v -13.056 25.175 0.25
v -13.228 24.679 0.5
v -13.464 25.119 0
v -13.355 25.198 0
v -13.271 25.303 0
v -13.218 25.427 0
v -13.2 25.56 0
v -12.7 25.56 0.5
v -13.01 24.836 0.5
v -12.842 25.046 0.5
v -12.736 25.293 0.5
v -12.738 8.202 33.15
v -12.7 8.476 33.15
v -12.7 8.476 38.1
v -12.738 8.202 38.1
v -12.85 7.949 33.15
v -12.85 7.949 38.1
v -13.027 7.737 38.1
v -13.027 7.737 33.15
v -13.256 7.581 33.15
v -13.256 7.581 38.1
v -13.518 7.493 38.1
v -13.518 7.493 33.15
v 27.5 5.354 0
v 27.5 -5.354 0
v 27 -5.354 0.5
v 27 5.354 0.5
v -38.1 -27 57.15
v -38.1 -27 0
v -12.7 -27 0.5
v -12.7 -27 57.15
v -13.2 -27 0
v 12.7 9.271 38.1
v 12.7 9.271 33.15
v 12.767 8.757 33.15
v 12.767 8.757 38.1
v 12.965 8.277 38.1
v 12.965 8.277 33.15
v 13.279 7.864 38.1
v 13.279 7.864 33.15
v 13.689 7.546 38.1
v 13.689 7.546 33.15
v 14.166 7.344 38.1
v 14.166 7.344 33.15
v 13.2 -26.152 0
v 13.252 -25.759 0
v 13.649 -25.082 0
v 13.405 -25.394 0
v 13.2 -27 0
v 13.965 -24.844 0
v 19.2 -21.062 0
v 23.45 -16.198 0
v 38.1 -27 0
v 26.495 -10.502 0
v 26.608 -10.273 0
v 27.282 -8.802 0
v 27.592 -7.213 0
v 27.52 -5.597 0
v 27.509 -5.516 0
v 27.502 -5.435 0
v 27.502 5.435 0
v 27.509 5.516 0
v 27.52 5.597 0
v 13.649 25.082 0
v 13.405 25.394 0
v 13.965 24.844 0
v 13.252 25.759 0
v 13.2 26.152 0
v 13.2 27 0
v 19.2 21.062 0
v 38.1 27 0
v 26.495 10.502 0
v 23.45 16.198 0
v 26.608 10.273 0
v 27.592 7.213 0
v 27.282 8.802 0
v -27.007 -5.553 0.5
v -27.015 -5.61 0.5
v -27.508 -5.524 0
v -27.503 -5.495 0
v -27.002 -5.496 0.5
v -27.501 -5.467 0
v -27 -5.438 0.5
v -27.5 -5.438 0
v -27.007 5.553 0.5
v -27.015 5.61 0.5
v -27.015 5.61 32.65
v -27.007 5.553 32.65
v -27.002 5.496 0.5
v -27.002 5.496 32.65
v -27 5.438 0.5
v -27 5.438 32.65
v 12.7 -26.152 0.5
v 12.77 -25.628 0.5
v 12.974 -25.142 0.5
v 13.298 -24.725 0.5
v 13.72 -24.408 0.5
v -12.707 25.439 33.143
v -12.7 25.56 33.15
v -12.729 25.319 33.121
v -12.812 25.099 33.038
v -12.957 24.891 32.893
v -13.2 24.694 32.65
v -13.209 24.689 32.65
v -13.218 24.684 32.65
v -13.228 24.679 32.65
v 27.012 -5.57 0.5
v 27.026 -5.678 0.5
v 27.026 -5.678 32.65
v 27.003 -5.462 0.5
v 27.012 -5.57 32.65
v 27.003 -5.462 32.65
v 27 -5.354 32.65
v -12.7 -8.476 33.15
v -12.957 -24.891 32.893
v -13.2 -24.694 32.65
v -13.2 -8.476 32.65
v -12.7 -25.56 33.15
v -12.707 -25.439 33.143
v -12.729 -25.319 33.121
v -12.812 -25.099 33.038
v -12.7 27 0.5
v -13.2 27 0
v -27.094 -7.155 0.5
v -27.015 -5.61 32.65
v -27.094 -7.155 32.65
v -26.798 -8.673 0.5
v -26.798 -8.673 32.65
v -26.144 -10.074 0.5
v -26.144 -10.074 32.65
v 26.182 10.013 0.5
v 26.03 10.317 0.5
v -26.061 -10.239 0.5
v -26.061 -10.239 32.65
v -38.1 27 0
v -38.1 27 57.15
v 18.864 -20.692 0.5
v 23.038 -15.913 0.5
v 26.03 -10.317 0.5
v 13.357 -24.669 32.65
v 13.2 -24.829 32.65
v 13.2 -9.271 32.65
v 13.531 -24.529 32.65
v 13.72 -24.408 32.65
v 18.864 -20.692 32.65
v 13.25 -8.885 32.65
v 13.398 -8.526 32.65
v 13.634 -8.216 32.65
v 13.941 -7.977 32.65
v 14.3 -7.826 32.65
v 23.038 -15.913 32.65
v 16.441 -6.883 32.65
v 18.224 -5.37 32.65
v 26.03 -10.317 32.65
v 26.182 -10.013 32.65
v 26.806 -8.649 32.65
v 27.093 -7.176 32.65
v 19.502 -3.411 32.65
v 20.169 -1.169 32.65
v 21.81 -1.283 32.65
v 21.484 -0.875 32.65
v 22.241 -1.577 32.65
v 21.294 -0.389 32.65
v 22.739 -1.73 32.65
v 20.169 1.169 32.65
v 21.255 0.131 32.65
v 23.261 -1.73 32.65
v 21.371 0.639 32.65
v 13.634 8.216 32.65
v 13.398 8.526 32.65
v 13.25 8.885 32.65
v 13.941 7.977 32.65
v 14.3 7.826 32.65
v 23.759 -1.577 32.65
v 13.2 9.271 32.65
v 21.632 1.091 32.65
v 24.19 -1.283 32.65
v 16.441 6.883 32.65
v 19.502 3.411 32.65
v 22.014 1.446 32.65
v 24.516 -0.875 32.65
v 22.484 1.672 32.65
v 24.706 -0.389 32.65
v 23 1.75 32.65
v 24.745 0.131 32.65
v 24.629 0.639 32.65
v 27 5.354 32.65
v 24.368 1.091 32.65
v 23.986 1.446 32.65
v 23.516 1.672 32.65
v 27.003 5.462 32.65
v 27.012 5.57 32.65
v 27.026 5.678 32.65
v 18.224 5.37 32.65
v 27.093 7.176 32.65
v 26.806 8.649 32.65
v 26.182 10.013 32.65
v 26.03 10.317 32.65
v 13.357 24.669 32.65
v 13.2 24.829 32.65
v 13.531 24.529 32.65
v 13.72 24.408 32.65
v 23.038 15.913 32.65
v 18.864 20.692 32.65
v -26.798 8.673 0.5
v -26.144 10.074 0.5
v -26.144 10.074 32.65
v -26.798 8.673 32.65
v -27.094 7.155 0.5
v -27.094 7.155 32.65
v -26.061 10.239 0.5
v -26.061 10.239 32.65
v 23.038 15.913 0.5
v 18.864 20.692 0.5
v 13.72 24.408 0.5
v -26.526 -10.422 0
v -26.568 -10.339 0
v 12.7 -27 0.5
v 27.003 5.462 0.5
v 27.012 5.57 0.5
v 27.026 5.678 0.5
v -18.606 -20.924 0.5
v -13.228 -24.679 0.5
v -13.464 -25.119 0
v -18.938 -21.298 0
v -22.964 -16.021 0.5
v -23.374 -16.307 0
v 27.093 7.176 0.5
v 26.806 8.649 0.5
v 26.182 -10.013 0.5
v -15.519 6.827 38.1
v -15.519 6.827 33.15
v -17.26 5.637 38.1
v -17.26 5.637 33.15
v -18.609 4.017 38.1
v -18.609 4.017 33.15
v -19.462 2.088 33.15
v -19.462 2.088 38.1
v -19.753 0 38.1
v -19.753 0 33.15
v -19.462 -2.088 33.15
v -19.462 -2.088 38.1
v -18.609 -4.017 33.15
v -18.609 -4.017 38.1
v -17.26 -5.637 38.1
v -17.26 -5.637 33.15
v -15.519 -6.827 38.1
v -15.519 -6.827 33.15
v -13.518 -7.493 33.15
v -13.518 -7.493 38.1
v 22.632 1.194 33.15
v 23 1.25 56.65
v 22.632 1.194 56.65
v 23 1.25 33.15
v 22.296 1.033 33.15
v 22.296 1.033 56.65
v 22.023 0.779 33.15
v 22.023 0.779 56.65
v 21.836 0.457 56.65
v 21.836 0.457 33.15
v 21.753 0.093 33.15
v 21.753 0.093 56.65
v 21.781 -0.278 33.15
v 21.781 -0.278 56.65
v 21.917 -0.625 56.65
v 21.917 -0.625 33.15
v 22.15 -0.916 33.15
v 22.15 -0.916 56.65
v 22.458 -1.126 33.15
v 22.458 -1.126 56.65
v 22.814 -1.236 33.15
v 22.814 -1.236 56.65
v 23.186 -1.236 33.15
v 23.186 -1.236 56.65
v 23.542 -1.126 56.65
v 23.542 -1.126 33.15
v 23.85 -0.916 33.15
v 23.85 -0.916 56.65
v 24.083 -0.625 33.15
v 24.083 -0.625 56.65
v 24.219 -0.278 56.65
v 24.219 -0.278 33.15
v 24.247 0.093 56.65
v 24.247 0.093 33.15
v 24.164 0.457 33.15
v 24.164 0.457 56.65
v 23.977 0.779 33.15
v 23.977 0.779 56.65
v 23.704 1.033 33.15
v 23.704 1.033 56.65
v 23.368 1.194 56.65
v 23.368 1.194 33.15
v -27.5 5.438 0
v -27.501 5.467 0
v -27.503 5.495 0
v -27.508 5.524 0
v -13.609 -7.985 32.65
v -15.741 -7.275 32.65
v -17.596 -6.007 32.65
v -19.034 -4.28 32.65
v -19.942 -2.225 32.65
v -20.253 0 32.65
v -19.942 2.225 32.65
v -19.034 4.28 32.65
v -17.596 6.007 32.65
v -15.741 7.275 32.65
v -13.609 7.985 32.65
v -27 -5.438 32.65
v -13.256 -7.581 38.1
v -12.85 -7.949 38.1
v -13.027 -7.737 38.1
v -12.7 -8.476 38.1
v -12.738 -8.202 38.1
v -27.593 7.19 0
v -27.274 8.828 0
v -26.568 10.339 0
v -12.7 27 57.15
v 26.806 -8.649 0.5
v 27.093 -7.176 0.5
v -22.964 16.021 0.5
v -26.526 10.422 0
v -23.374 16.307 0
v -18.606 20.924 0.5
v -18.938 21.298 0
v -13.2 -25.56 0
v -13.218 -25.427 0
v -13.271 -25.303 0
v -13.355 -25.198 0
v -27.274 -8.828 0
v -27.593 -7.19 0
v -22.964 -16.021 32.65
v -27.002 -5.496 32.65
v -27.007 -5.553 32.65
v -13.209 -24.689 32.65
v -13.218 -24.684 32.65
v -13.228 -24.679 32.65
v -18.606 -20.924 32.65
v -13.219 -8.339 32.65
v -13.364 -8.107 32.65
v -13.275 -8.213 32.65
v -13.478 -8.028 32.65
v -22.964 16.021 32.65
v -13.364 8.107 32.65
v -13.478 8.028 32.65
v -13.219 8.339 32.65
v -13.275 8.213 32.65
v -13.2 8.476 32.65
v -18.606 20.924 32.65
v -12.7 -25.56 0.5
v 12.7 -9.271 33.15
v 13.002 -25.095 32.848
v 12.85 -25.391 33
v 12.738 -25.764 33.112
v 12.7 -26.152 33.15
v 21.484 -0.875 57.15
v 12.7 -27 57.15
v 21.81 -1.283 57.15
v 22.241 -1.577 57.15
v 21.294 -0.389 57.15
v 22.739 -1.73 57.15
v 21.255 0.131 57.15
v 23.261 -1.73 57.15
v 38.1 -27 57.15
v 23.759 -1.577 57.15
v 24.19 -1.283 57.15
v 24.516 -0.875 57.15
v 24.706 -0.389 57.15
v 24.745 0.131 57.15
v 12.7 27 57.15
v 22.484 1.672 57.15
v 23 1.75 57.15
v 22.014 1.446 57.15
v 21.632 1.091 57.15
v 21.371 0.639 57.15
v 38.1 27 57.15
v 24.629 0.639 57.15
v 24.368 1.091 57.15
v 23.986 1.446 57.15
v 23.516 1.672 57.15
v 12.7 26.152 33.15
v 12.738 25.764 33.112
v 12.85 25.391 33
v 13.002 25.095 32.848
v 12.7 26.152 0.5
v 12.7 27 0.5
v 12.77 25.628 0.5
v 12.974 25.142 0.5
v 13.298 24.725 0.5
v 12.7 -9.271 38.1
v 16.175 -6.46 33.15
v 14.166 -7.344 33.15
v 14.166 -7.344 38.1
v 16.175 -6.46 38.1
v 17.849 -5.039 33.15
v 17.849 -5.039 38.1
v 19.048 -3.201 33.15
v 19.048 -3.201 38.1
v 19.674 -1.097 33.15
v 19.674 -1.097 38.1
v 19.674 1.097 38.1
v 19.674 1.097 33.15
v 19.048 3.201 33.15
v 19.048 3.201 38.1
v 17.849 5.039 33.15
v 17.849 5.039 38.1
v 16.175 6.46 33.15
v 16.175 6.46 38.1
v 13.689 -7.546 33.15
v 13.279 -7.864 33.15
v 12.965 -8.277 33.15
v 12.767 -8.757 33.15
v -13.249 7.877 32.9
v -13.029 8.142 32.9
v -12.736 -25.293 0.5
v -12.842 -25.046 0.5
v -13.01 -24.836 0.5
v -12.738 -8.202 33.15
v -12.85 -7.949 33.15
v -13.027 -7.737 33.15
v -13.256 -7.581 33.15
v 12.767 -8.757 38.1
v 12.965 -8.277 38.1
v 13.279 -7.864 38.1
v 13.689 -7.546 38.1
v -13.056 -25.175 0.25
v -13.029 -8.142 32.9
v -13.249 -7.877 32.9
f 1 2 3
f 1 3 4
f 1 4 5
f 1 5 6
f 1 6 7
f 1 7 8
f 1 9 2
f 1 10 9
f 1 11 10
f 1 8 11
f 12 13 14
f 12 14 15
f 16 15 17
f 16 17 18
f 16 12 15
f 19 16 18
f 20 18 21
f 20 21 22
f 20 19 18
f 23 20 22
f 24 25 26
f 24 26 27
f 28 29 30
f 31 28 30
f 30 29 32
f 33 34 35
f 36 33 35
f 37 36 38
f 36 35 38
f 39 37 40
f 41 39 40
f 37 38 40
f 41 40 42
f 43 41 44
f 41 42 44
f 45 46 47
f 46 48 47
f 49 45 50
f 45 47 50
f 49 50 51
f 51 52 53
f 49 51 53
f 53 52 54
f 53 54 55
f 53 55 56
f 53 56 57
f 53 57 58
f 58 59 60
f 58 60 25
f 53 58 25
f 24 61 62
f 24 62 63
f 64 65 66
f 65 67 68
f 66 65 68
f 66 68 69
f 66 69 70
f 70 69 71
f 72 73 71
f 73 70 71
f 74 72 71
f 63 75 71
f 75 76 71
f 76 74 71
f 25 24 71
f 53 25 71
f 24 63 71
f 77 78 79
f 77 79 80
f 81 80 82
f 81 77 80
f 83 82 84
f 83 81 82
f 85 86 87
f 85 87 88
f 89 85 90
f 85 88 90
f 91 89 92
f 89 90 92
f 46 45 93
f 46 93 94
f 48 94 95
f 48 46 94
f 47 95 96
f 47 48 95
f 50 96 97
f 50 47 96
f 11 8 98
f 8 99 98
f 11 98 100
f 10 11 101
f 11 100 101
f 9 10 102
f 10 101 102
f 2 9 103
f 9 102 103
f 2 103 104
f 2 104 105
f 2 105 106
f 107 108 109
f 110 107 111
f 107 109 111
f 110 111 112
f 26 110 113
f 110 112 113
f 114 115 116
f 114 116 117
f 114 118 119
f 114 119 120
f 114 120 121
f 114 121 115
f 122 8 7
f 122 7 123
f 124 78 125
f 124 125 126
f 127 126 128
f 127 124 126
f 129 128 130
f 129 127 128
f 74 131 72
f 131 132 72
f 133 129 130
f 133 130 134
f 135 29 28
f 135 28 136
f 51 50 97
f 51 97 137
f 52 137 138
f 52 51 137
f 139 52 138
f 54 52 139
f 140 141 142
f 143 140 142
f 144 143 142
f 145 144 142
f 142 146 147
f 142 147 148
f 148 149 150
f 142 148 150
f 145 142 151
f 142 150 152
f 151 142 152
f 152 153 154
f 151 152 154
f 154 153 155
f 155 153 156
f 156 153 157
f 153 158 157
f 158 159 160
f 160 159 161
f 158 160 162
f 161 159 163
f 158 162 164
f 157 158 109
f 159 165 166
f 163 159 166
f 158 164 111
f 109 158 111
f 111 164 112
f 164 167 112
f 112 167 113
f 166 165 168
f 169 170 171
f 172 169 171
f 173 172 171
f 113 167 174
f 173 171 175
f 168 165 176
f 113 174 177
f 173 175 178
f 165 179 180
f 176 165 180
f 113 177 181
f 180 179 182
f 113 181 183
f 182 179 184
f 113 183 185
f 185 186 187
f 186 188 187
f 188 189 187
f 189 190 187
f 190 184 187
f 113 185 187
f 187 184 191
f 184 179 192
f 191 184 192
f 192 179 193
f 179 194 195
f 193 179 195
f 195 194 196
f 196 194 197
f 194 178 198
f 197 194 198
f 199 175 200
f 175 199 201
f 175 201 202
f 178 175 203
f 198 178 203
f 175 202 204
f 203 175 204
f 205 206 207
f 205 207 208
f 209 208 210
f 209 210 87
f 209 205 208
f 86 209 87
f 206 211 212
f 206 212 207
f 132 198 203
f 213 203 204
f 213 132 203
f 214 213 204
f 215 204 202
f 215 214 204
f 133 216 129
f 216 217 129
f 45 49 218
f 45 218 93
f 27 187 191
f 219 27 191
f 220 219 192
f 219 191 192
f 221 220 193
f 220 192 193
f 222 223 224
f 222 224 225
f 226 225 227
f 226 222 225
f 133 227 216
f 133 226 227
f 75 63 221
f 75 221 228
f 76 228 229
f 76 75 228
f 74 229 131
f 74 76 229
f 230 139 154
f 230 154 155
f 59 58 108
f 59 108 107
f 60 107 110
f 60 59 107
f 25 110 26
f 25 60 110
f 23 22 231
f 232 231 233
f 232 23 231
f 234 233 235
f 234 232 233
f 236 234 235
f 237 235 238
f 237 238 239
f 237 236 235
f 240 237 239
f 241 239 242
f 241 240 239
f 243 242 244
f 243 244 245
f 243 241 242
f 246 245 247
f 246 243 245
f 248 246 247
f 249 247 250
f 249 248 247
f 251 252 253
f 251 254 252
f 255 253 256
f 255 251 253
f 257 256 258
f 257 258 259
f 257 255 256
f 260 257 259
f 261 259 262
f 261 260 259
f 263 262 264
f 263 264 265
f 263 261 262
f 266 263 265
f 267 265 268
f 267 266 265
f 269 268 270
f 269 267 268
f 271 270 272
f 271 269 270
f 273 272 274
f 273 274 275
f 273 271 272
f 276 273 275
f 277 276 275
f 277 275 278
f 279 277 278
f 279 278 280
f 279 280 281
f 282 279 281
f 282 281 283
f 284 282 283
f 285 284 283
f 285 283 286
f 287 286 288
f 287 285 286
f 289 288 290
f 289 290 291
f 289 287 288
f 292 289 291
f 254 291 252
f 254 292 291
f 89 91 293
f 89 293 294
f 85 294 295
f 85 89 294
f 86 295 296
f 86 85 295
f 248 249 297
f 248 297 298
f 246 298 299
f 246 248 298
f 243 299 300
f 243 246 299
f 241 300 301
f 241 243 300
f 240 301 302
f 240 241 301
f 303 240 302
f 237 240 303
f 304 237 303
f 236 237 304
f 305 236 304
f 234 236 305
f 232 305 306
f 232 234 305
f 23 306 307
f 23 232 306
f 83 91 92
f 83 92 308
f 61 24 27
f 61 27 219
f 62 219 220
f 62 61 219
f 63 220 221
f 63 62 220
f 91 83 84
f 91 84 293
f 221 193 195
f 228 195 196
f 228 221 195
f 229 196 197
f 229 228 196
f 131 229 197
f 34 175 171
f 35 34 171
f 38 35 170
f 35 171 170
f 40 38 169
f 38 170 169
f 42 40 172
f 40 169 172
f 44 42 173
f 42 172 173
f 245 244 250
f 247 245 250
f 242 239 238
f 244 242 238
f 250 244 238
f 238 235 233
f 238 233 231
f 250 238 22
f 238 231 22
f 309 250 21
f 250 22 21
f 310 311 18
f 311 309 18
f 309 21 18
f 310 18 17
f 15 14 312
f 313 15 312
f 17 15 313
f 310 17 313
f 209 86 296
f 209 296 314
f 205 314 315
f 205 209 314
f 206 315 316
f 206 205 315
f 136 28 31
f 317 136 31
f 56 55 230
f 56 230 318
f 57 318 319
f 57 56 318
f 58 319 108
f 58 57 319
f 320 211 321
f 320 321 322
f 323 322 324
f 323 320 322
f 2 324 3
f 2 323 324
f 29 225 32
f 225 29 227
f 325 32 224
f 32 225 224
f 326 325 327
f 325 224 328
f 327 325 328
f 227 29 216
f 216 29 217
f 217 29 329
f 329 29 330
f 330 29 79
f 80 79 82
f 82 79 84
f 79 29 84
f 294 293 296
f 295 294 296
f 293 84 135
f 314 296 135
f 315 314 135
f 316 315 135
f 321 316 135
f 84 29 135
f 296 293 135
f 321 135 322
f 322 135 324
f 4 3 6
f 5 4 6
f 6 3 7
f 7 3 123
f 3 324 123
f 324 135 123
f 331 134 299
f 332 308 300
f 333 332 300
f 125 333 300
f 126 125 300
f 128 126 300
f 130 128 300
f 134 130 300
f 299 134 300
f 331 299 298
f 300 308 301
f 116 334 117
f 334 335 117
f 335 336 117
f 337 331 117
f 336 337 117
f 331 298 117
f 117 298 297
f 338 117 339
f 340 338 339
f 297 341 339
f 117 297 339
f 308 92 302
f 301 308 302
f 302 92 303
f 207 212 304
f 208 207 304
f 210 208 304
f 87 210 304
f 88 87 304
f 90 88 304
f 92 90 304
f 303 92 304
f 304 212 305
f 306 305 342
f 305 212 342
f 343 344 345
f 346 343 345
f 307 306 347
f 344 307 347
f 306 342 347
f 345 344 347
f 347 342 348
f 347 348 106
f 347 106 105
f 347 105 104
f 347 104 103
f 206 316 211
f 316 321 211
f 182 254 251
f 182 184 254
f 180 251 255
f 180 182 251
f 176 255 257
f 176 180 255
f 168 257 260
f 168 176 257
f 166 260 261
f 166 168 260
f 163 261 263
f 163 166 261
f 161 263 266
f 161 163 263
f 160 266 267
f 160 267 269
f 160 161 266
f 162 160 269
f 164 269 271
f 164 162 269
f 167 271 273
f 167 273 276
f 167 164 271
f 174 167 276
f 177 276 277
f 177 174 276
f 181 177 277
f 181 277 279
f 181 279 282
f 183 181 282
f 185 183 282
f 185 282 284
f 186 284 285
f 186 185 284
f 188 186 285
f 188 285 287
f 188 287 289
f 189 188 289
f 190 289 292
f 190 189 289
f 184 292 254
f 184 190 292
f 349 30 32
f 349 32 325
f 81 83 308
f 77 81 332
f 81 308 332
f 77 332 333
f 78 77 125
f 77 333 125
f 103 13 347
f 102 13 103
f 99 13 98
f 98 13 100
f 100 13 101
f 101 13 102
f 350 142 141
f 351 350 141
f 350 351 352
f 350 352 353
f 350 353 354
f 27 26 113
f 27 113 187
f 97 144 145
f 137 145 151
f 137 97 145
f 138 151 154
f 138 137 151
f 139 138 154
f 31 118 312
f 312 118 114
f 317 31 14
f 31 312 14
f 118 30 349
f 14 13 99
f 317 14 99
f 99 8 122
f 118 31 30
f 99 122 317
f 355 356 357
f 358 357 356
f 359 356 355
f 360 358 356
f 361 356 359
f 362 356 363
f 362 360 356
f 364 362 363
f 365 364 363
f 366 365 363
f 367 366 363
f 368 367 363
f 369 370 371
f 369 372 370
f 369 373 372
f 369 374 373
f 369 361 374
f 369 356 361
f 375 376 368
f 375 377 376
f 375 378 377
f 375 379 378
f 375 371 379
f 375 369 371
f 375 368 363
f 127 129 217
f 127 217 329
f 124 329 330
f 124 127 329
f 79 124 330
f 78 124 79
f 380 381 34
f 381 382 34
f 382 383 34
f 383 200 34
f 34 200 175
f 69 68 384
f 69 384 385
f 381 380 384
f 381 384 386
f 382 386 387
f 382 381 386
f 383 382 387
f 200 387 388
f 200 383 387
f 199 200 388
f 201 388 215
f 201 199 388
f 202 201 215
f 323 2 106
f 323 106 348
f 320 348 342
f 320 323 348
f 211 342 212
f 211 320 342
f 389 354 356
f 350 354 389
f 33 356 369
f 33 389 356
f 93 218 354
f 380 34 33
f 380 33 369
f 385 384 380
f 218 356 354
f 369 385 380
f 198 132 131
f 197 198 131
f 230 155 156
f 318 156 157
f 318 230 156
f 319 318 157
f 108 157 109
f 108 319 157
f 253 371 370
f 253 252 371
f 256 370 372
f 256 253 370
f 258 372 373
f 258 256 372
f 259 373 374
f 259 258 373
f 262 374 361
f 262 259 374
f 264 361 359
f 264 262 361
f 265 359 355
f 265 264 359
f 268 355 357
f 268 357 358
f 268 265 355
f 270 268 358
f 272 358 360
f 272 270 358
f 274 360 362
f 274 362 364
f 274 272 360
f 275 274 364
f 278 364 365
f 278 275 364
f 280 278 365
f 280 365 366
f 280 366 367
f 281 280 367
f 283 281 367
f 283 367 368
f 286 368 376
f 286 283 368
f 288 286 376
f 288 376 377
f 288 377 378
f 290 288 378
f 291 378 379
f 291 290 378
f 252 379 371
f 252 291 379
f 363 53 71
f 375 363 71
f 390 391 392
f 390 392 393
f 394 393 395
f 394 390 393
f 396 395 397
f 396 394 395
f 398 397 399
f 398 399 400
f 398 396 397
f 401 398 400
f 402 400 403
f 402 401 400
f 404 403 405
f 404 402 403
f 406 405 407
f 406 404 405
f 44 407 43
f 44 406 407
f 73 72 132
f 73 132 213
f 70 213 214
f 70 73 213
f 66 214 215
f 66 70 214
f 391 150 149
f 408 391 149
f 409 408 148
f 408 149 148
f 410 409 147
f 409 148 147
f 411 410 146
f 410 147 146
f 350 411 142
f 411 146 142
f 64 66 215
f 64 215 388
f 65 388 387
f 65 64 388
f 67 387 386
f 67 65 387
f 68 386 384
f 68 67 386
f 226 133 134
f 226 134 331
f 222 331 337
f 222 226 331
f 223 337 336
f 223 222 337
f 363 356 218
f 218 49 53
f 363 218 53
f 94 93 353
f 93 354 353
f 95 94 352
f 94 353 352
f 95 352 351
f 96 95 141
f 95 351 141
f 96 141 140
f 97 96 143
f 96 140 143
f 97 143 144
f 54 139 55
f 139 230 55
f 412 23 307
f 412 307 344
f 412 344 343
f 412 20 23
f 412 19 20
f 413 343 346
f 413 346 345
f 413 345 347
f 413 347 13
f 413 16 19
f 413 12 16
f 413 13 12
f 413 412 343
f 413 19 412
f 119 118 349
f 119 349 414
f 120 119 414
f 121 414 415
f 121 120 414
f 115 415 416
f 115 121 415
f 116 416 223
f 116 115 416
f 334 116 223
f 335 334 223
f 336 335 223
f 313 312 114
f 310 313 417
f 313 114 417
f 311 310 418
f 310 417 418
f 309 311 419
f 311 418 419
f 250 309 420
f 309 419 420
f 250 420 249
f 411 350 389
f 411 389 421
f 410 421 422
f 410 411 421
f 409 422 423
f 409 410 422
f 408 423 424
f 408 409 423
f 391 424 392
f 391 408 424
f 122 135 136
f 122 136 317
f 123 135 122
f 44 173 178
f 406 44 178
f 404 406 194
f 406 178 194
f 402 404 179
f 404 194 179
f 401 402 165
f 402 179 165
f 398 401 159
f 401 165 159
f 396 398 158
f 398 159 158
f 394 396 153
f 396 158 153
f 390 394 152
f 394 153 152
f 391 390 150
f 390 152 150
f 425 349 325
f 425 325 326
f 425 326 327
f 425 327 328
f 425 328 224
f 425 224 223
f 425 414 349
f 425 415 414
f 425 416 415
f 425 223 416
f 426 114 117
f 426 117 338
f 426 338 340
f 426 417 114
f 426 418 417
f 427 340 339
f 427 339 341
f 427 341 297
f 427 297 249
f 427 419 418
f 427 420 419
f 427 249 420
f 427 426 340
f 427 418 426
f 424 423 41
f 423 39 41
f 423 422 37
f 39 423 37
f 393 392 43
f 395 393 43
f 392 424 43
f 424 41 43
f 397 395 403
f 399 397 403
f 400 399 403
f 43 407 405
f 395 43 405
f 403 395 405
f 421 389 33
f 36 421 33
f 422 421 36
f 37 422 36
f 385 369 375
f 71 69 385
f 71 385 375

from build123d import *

# Parameters (mm, degrees)
SOFT_JAW_STOCK_SKETCH_W       = 25.4
SOFT_JAW_STOCK_SKETCH_H       = 54
SOFT_JAW_STOCK_DEPTH          = 57.15
SOFT_JAW_STOCK_2_DEPTH        = 57.15
SOFT_JAW_BODY_CUTOUT_DEPTH    = 32.65
SOFT_JAW_CUTOUT_SKETCH_7_R    = 7.62
SOFT_JAW_HOLE_CLEARANCE_DEPTH = 38.1
FILLET1_R                     = 1
FILLET2_R                     = 2
CHAMFER1_SIZE                 = 0.5
CHAMFER2_SIZE                 = 0.5


with BuildPart() as part:
    # soft_jaw_stock_sketch → soft_jaw_stock (new body)
    with BuildSketch(Plane.XY):
        with Locations((25.4, 0)):
            Rectangle(SOFT_JAW_STOCK_SKETCH_W, SOFT_JAW_STOCK_SKETCH_H)
    extrude(amount=SOFT_JAW_STOCK_DEPTH)


with BuildPart() as body_2:
    # soft_jaw_stock_sketch → soft_jaw_stock 2 (new body)
    with BuildSketch(Plane.XY):
        with Locations((-25.4, 0)):
            Rectangle(SOFT_JAW_STOCK_SKETCH_W, SOFT_JAW_STOCK_SKETCH_H)
    extrude(amount=SOFT_JAW_STOCK_2_DEPTH)


with BuildPart() as soft_jaw_body_cutout_tool:
    # soft_jaw_cutout_sketch → soft_jaw_body_cutout (new body)
    with BuildSketch(Plane.XY):
        with BuildLine():
            ThreePointArc((-26.095423855, 10.150312992), (-26.99213364, 7.926098963), (-27, 5.527942461))
            Line((-27, 5.527942461), (-27, -5.527942461))
            ThreePointArc((-27, -5.527942461), (-26.99213364, -7.926098963), (-26.095423855, -10.150312992))
            ThreePointArc((-26.095423855, -10.150312992), (-20.761976894, -18.786705817), (-12.7, -24.95415797))
            Line((-12.7, -24.95415797), (-12.7, 24.95415797))
            ThreePointArc((-12.7, 24.95415797), (-20.761976894, 18.786705817), (-26.095423855, 10.150312992))
        make_face()
        with BuildLine():
            ThreePointArc((26.095423855, -10.150312992), (26.99213364, -7.926098963), (27, -5.527942461))
            Line((27, -5.527942461), (27, 5.527942461))
            ThreePointArc((27, 5.527942461), (26.99213364, 7.926098963), (26.095423855, 10.150312992))
            ThreePointArc((26.095423855, 10.150312992), (20.761976894, 18.786705817), (12.7, 24.95415797))
            Line((12.7, 24.95415797), (12.7, -24.95415797))
            ThreePointArc((12.7, -24.95415797), (20.761976894, -18.786705817), (26.095423855, -10.150312992))
        make_face()
    extrude(amount=SOFT_JAW_BODY_CUTOUT_DEPTH)


with BuildPart() as part_1:
    add(part.part)

    # soft_jaw_body_cutout: cut by soft_jaw_body_cutout_tool
    add(soft_jaw_body_cutout_tool.part, mode=Mode.SUBTRACT)


with BuildPart() as body_2_1:
    add(body_2.part)

    # soft_jaw_body_cutout: cut by soft_jaw_body_cutout_tool
    add(soft_jaw_body_cutout_tool.part, mode=Mode.SUBTRACT)


with BuildPart() as soft_jaw_hole_clearance_tool:
    # soft_jaw_cutout_sketch_7 → soft_jaw_hole_clearance (new body)
    with BuildSketch(Plane.XY):
        with Locations((-12.133259165, 0)):
            Circle(SOFT_JAW_CUTOUT_SKETCH_7_R)
        with Locations((12.133259165, 0)):
            Circle(SOFT_JAW_CUTOUT_SKETCH_7_R)
    extrude(amount=SOFT_JAW_HOLE_CLEARANCE_DEPTH)


with BuildPart() as part_2:
    add(part_1.part)

    # soft_jaw_hole_clearance: cut by soft_jaw_hole_clearance_tool
    add(soft_jaw_hole_clearance_tool.part, mode=Mode.SUBTRACT)

    # Sketch3 → alignment_pin_hole (revolve, cut)
    with BuildSketch(Plane(origin=(23, 0, 32.65), x_dir=(0, 1, 0), z_dir=(1, 0, 0))):
        Polygon((0, 0), (0, 24.5), (1.75, 24.5), (1.25, 24), (1.25, 0.5), (1.75, 0), align=None)
    revolve(axis=Axis((23, 0, 26.3), (0, 0, 1)), mode=Mode.SUBTRACT)

    # Fillet2
    fillet2_edges = [part_2.edges().sort_by_distance(p)[0] for p in [
        (26.095423855, 10.150312992, 16.325),
        (12.7, 24.95415797, 16.325),
        (12.7, -24.95415797, 16.325),
        (26.095423855, -10.150312992, 16.325),
        (27, -5.527942461, 16.325),
        (27, 5.527942461, 16.325),
        (12.7, -7.598894974, 35.375),
        (12.7, 7.598894974, 35.375),
    ]]
    fillet(fillet2_edges, radius=FILLET2_R)

    # Chamfer1
    chamfer1_edges = [part_2.edges().sort_by_distance(p)[0] for p in [
        (12.7, -17.711465941, 32.65),
        (12.7, 26.575836493, 0),
        (19.753259165, 0, 32.65),
        (12.7, 17.711465941, 32.65),
        (13.108263227, -8.06031957, 32.65),
        (13.108263227, 8.06031957, 32.65),
        (12.7, -26.575836493, 0),
        (21.086700189, 18.421484065, 0),
        (21.086700189, -18.421484065, 0),
        (26.993097288, -7.921164374, 0),
        (27, 0, 0),
        (26.993097288, 7.921164374, 0),
        (12.97373235, -25.141722493, 0),
        (26.099203165, -10.162005275, 0),
        (27.006618191, -5.516169884, 0),
        (27.006618191, 5.516169884, 0),
        (26.099203165, 10.162005275, 0),
        (12.97373235, 25.141722493, 0),
    ]]
    chamfer(chamfer1_edges, length=CHAMFER1_SIZE)


with BuildPart() as body_2_2:
    add(body_2_1.part)

    # soft_jaw_hole_clearance: cut by soft_jaw_hole_clearance_tool
    add(soft_jaw_hole_clearance_tool.part, mode=Mode.SUBTRACT)

    # Fillet1
    fillet1_edges = [body_2_2.edges().sort_by_distance(p)[0] for p in [
        (-12.7, 24.95415797, 16.325),
        (-26.095423855, 10.150312992, 16.325),
        (-27, 5.527942461, 16.325),
        (-27, -5.527942461, 16.325),
        (-12.7, -24.95415797, 16.325),
        (-26.095423855, -10.150312992, 16.325),
        (-12.7, -7.598894974, 35.375),
        (-12.7, 7.598894974, 35.375),
    ]]
    fillet(fillet1_edges, radius=FILLET1_R)

    # Chamfer2
    chamfer2_edges = [body_2_2.edges().sort_by_distance(p)[0] for p in [
        (-12.7, -17.018175589, 32.65),
        (-12.7, 26.279964789, 0),
        (-19.753259165, 0, 32.65),
        (-12.7, 17.018175589, 32.65),
        (-12.7, -26.279964789, 0),
        (-12.931313953, -7.836795334, 32.65),
        (-12.931313953, 7.836795334, 32.65),
        (-20.928900221, -18.60056815, 0),
        (-20.928900221, 18.60056815, 0),
        (-26.992732561, 7.923034492, 0),
        (-27, 0, 0),
        (-26.992732561, -7.923034492, 0),
        (-12.841975002, 25.04632165, 0),
        (-26.098439519, 10.154727337, 0),
        (-27.003760162, 5.52441143, 0),
        (-27.003760162, -5.52441143, 0),
        (-26.098439519, -10.154727337, 0),
        (-12.841975002, -25.04632165, 0),
    ]]
    chamfer(chamfer2_edges, length=CHAMFER2_SIZE)


solid = Compound([part_2.part, body_2_2.part])
